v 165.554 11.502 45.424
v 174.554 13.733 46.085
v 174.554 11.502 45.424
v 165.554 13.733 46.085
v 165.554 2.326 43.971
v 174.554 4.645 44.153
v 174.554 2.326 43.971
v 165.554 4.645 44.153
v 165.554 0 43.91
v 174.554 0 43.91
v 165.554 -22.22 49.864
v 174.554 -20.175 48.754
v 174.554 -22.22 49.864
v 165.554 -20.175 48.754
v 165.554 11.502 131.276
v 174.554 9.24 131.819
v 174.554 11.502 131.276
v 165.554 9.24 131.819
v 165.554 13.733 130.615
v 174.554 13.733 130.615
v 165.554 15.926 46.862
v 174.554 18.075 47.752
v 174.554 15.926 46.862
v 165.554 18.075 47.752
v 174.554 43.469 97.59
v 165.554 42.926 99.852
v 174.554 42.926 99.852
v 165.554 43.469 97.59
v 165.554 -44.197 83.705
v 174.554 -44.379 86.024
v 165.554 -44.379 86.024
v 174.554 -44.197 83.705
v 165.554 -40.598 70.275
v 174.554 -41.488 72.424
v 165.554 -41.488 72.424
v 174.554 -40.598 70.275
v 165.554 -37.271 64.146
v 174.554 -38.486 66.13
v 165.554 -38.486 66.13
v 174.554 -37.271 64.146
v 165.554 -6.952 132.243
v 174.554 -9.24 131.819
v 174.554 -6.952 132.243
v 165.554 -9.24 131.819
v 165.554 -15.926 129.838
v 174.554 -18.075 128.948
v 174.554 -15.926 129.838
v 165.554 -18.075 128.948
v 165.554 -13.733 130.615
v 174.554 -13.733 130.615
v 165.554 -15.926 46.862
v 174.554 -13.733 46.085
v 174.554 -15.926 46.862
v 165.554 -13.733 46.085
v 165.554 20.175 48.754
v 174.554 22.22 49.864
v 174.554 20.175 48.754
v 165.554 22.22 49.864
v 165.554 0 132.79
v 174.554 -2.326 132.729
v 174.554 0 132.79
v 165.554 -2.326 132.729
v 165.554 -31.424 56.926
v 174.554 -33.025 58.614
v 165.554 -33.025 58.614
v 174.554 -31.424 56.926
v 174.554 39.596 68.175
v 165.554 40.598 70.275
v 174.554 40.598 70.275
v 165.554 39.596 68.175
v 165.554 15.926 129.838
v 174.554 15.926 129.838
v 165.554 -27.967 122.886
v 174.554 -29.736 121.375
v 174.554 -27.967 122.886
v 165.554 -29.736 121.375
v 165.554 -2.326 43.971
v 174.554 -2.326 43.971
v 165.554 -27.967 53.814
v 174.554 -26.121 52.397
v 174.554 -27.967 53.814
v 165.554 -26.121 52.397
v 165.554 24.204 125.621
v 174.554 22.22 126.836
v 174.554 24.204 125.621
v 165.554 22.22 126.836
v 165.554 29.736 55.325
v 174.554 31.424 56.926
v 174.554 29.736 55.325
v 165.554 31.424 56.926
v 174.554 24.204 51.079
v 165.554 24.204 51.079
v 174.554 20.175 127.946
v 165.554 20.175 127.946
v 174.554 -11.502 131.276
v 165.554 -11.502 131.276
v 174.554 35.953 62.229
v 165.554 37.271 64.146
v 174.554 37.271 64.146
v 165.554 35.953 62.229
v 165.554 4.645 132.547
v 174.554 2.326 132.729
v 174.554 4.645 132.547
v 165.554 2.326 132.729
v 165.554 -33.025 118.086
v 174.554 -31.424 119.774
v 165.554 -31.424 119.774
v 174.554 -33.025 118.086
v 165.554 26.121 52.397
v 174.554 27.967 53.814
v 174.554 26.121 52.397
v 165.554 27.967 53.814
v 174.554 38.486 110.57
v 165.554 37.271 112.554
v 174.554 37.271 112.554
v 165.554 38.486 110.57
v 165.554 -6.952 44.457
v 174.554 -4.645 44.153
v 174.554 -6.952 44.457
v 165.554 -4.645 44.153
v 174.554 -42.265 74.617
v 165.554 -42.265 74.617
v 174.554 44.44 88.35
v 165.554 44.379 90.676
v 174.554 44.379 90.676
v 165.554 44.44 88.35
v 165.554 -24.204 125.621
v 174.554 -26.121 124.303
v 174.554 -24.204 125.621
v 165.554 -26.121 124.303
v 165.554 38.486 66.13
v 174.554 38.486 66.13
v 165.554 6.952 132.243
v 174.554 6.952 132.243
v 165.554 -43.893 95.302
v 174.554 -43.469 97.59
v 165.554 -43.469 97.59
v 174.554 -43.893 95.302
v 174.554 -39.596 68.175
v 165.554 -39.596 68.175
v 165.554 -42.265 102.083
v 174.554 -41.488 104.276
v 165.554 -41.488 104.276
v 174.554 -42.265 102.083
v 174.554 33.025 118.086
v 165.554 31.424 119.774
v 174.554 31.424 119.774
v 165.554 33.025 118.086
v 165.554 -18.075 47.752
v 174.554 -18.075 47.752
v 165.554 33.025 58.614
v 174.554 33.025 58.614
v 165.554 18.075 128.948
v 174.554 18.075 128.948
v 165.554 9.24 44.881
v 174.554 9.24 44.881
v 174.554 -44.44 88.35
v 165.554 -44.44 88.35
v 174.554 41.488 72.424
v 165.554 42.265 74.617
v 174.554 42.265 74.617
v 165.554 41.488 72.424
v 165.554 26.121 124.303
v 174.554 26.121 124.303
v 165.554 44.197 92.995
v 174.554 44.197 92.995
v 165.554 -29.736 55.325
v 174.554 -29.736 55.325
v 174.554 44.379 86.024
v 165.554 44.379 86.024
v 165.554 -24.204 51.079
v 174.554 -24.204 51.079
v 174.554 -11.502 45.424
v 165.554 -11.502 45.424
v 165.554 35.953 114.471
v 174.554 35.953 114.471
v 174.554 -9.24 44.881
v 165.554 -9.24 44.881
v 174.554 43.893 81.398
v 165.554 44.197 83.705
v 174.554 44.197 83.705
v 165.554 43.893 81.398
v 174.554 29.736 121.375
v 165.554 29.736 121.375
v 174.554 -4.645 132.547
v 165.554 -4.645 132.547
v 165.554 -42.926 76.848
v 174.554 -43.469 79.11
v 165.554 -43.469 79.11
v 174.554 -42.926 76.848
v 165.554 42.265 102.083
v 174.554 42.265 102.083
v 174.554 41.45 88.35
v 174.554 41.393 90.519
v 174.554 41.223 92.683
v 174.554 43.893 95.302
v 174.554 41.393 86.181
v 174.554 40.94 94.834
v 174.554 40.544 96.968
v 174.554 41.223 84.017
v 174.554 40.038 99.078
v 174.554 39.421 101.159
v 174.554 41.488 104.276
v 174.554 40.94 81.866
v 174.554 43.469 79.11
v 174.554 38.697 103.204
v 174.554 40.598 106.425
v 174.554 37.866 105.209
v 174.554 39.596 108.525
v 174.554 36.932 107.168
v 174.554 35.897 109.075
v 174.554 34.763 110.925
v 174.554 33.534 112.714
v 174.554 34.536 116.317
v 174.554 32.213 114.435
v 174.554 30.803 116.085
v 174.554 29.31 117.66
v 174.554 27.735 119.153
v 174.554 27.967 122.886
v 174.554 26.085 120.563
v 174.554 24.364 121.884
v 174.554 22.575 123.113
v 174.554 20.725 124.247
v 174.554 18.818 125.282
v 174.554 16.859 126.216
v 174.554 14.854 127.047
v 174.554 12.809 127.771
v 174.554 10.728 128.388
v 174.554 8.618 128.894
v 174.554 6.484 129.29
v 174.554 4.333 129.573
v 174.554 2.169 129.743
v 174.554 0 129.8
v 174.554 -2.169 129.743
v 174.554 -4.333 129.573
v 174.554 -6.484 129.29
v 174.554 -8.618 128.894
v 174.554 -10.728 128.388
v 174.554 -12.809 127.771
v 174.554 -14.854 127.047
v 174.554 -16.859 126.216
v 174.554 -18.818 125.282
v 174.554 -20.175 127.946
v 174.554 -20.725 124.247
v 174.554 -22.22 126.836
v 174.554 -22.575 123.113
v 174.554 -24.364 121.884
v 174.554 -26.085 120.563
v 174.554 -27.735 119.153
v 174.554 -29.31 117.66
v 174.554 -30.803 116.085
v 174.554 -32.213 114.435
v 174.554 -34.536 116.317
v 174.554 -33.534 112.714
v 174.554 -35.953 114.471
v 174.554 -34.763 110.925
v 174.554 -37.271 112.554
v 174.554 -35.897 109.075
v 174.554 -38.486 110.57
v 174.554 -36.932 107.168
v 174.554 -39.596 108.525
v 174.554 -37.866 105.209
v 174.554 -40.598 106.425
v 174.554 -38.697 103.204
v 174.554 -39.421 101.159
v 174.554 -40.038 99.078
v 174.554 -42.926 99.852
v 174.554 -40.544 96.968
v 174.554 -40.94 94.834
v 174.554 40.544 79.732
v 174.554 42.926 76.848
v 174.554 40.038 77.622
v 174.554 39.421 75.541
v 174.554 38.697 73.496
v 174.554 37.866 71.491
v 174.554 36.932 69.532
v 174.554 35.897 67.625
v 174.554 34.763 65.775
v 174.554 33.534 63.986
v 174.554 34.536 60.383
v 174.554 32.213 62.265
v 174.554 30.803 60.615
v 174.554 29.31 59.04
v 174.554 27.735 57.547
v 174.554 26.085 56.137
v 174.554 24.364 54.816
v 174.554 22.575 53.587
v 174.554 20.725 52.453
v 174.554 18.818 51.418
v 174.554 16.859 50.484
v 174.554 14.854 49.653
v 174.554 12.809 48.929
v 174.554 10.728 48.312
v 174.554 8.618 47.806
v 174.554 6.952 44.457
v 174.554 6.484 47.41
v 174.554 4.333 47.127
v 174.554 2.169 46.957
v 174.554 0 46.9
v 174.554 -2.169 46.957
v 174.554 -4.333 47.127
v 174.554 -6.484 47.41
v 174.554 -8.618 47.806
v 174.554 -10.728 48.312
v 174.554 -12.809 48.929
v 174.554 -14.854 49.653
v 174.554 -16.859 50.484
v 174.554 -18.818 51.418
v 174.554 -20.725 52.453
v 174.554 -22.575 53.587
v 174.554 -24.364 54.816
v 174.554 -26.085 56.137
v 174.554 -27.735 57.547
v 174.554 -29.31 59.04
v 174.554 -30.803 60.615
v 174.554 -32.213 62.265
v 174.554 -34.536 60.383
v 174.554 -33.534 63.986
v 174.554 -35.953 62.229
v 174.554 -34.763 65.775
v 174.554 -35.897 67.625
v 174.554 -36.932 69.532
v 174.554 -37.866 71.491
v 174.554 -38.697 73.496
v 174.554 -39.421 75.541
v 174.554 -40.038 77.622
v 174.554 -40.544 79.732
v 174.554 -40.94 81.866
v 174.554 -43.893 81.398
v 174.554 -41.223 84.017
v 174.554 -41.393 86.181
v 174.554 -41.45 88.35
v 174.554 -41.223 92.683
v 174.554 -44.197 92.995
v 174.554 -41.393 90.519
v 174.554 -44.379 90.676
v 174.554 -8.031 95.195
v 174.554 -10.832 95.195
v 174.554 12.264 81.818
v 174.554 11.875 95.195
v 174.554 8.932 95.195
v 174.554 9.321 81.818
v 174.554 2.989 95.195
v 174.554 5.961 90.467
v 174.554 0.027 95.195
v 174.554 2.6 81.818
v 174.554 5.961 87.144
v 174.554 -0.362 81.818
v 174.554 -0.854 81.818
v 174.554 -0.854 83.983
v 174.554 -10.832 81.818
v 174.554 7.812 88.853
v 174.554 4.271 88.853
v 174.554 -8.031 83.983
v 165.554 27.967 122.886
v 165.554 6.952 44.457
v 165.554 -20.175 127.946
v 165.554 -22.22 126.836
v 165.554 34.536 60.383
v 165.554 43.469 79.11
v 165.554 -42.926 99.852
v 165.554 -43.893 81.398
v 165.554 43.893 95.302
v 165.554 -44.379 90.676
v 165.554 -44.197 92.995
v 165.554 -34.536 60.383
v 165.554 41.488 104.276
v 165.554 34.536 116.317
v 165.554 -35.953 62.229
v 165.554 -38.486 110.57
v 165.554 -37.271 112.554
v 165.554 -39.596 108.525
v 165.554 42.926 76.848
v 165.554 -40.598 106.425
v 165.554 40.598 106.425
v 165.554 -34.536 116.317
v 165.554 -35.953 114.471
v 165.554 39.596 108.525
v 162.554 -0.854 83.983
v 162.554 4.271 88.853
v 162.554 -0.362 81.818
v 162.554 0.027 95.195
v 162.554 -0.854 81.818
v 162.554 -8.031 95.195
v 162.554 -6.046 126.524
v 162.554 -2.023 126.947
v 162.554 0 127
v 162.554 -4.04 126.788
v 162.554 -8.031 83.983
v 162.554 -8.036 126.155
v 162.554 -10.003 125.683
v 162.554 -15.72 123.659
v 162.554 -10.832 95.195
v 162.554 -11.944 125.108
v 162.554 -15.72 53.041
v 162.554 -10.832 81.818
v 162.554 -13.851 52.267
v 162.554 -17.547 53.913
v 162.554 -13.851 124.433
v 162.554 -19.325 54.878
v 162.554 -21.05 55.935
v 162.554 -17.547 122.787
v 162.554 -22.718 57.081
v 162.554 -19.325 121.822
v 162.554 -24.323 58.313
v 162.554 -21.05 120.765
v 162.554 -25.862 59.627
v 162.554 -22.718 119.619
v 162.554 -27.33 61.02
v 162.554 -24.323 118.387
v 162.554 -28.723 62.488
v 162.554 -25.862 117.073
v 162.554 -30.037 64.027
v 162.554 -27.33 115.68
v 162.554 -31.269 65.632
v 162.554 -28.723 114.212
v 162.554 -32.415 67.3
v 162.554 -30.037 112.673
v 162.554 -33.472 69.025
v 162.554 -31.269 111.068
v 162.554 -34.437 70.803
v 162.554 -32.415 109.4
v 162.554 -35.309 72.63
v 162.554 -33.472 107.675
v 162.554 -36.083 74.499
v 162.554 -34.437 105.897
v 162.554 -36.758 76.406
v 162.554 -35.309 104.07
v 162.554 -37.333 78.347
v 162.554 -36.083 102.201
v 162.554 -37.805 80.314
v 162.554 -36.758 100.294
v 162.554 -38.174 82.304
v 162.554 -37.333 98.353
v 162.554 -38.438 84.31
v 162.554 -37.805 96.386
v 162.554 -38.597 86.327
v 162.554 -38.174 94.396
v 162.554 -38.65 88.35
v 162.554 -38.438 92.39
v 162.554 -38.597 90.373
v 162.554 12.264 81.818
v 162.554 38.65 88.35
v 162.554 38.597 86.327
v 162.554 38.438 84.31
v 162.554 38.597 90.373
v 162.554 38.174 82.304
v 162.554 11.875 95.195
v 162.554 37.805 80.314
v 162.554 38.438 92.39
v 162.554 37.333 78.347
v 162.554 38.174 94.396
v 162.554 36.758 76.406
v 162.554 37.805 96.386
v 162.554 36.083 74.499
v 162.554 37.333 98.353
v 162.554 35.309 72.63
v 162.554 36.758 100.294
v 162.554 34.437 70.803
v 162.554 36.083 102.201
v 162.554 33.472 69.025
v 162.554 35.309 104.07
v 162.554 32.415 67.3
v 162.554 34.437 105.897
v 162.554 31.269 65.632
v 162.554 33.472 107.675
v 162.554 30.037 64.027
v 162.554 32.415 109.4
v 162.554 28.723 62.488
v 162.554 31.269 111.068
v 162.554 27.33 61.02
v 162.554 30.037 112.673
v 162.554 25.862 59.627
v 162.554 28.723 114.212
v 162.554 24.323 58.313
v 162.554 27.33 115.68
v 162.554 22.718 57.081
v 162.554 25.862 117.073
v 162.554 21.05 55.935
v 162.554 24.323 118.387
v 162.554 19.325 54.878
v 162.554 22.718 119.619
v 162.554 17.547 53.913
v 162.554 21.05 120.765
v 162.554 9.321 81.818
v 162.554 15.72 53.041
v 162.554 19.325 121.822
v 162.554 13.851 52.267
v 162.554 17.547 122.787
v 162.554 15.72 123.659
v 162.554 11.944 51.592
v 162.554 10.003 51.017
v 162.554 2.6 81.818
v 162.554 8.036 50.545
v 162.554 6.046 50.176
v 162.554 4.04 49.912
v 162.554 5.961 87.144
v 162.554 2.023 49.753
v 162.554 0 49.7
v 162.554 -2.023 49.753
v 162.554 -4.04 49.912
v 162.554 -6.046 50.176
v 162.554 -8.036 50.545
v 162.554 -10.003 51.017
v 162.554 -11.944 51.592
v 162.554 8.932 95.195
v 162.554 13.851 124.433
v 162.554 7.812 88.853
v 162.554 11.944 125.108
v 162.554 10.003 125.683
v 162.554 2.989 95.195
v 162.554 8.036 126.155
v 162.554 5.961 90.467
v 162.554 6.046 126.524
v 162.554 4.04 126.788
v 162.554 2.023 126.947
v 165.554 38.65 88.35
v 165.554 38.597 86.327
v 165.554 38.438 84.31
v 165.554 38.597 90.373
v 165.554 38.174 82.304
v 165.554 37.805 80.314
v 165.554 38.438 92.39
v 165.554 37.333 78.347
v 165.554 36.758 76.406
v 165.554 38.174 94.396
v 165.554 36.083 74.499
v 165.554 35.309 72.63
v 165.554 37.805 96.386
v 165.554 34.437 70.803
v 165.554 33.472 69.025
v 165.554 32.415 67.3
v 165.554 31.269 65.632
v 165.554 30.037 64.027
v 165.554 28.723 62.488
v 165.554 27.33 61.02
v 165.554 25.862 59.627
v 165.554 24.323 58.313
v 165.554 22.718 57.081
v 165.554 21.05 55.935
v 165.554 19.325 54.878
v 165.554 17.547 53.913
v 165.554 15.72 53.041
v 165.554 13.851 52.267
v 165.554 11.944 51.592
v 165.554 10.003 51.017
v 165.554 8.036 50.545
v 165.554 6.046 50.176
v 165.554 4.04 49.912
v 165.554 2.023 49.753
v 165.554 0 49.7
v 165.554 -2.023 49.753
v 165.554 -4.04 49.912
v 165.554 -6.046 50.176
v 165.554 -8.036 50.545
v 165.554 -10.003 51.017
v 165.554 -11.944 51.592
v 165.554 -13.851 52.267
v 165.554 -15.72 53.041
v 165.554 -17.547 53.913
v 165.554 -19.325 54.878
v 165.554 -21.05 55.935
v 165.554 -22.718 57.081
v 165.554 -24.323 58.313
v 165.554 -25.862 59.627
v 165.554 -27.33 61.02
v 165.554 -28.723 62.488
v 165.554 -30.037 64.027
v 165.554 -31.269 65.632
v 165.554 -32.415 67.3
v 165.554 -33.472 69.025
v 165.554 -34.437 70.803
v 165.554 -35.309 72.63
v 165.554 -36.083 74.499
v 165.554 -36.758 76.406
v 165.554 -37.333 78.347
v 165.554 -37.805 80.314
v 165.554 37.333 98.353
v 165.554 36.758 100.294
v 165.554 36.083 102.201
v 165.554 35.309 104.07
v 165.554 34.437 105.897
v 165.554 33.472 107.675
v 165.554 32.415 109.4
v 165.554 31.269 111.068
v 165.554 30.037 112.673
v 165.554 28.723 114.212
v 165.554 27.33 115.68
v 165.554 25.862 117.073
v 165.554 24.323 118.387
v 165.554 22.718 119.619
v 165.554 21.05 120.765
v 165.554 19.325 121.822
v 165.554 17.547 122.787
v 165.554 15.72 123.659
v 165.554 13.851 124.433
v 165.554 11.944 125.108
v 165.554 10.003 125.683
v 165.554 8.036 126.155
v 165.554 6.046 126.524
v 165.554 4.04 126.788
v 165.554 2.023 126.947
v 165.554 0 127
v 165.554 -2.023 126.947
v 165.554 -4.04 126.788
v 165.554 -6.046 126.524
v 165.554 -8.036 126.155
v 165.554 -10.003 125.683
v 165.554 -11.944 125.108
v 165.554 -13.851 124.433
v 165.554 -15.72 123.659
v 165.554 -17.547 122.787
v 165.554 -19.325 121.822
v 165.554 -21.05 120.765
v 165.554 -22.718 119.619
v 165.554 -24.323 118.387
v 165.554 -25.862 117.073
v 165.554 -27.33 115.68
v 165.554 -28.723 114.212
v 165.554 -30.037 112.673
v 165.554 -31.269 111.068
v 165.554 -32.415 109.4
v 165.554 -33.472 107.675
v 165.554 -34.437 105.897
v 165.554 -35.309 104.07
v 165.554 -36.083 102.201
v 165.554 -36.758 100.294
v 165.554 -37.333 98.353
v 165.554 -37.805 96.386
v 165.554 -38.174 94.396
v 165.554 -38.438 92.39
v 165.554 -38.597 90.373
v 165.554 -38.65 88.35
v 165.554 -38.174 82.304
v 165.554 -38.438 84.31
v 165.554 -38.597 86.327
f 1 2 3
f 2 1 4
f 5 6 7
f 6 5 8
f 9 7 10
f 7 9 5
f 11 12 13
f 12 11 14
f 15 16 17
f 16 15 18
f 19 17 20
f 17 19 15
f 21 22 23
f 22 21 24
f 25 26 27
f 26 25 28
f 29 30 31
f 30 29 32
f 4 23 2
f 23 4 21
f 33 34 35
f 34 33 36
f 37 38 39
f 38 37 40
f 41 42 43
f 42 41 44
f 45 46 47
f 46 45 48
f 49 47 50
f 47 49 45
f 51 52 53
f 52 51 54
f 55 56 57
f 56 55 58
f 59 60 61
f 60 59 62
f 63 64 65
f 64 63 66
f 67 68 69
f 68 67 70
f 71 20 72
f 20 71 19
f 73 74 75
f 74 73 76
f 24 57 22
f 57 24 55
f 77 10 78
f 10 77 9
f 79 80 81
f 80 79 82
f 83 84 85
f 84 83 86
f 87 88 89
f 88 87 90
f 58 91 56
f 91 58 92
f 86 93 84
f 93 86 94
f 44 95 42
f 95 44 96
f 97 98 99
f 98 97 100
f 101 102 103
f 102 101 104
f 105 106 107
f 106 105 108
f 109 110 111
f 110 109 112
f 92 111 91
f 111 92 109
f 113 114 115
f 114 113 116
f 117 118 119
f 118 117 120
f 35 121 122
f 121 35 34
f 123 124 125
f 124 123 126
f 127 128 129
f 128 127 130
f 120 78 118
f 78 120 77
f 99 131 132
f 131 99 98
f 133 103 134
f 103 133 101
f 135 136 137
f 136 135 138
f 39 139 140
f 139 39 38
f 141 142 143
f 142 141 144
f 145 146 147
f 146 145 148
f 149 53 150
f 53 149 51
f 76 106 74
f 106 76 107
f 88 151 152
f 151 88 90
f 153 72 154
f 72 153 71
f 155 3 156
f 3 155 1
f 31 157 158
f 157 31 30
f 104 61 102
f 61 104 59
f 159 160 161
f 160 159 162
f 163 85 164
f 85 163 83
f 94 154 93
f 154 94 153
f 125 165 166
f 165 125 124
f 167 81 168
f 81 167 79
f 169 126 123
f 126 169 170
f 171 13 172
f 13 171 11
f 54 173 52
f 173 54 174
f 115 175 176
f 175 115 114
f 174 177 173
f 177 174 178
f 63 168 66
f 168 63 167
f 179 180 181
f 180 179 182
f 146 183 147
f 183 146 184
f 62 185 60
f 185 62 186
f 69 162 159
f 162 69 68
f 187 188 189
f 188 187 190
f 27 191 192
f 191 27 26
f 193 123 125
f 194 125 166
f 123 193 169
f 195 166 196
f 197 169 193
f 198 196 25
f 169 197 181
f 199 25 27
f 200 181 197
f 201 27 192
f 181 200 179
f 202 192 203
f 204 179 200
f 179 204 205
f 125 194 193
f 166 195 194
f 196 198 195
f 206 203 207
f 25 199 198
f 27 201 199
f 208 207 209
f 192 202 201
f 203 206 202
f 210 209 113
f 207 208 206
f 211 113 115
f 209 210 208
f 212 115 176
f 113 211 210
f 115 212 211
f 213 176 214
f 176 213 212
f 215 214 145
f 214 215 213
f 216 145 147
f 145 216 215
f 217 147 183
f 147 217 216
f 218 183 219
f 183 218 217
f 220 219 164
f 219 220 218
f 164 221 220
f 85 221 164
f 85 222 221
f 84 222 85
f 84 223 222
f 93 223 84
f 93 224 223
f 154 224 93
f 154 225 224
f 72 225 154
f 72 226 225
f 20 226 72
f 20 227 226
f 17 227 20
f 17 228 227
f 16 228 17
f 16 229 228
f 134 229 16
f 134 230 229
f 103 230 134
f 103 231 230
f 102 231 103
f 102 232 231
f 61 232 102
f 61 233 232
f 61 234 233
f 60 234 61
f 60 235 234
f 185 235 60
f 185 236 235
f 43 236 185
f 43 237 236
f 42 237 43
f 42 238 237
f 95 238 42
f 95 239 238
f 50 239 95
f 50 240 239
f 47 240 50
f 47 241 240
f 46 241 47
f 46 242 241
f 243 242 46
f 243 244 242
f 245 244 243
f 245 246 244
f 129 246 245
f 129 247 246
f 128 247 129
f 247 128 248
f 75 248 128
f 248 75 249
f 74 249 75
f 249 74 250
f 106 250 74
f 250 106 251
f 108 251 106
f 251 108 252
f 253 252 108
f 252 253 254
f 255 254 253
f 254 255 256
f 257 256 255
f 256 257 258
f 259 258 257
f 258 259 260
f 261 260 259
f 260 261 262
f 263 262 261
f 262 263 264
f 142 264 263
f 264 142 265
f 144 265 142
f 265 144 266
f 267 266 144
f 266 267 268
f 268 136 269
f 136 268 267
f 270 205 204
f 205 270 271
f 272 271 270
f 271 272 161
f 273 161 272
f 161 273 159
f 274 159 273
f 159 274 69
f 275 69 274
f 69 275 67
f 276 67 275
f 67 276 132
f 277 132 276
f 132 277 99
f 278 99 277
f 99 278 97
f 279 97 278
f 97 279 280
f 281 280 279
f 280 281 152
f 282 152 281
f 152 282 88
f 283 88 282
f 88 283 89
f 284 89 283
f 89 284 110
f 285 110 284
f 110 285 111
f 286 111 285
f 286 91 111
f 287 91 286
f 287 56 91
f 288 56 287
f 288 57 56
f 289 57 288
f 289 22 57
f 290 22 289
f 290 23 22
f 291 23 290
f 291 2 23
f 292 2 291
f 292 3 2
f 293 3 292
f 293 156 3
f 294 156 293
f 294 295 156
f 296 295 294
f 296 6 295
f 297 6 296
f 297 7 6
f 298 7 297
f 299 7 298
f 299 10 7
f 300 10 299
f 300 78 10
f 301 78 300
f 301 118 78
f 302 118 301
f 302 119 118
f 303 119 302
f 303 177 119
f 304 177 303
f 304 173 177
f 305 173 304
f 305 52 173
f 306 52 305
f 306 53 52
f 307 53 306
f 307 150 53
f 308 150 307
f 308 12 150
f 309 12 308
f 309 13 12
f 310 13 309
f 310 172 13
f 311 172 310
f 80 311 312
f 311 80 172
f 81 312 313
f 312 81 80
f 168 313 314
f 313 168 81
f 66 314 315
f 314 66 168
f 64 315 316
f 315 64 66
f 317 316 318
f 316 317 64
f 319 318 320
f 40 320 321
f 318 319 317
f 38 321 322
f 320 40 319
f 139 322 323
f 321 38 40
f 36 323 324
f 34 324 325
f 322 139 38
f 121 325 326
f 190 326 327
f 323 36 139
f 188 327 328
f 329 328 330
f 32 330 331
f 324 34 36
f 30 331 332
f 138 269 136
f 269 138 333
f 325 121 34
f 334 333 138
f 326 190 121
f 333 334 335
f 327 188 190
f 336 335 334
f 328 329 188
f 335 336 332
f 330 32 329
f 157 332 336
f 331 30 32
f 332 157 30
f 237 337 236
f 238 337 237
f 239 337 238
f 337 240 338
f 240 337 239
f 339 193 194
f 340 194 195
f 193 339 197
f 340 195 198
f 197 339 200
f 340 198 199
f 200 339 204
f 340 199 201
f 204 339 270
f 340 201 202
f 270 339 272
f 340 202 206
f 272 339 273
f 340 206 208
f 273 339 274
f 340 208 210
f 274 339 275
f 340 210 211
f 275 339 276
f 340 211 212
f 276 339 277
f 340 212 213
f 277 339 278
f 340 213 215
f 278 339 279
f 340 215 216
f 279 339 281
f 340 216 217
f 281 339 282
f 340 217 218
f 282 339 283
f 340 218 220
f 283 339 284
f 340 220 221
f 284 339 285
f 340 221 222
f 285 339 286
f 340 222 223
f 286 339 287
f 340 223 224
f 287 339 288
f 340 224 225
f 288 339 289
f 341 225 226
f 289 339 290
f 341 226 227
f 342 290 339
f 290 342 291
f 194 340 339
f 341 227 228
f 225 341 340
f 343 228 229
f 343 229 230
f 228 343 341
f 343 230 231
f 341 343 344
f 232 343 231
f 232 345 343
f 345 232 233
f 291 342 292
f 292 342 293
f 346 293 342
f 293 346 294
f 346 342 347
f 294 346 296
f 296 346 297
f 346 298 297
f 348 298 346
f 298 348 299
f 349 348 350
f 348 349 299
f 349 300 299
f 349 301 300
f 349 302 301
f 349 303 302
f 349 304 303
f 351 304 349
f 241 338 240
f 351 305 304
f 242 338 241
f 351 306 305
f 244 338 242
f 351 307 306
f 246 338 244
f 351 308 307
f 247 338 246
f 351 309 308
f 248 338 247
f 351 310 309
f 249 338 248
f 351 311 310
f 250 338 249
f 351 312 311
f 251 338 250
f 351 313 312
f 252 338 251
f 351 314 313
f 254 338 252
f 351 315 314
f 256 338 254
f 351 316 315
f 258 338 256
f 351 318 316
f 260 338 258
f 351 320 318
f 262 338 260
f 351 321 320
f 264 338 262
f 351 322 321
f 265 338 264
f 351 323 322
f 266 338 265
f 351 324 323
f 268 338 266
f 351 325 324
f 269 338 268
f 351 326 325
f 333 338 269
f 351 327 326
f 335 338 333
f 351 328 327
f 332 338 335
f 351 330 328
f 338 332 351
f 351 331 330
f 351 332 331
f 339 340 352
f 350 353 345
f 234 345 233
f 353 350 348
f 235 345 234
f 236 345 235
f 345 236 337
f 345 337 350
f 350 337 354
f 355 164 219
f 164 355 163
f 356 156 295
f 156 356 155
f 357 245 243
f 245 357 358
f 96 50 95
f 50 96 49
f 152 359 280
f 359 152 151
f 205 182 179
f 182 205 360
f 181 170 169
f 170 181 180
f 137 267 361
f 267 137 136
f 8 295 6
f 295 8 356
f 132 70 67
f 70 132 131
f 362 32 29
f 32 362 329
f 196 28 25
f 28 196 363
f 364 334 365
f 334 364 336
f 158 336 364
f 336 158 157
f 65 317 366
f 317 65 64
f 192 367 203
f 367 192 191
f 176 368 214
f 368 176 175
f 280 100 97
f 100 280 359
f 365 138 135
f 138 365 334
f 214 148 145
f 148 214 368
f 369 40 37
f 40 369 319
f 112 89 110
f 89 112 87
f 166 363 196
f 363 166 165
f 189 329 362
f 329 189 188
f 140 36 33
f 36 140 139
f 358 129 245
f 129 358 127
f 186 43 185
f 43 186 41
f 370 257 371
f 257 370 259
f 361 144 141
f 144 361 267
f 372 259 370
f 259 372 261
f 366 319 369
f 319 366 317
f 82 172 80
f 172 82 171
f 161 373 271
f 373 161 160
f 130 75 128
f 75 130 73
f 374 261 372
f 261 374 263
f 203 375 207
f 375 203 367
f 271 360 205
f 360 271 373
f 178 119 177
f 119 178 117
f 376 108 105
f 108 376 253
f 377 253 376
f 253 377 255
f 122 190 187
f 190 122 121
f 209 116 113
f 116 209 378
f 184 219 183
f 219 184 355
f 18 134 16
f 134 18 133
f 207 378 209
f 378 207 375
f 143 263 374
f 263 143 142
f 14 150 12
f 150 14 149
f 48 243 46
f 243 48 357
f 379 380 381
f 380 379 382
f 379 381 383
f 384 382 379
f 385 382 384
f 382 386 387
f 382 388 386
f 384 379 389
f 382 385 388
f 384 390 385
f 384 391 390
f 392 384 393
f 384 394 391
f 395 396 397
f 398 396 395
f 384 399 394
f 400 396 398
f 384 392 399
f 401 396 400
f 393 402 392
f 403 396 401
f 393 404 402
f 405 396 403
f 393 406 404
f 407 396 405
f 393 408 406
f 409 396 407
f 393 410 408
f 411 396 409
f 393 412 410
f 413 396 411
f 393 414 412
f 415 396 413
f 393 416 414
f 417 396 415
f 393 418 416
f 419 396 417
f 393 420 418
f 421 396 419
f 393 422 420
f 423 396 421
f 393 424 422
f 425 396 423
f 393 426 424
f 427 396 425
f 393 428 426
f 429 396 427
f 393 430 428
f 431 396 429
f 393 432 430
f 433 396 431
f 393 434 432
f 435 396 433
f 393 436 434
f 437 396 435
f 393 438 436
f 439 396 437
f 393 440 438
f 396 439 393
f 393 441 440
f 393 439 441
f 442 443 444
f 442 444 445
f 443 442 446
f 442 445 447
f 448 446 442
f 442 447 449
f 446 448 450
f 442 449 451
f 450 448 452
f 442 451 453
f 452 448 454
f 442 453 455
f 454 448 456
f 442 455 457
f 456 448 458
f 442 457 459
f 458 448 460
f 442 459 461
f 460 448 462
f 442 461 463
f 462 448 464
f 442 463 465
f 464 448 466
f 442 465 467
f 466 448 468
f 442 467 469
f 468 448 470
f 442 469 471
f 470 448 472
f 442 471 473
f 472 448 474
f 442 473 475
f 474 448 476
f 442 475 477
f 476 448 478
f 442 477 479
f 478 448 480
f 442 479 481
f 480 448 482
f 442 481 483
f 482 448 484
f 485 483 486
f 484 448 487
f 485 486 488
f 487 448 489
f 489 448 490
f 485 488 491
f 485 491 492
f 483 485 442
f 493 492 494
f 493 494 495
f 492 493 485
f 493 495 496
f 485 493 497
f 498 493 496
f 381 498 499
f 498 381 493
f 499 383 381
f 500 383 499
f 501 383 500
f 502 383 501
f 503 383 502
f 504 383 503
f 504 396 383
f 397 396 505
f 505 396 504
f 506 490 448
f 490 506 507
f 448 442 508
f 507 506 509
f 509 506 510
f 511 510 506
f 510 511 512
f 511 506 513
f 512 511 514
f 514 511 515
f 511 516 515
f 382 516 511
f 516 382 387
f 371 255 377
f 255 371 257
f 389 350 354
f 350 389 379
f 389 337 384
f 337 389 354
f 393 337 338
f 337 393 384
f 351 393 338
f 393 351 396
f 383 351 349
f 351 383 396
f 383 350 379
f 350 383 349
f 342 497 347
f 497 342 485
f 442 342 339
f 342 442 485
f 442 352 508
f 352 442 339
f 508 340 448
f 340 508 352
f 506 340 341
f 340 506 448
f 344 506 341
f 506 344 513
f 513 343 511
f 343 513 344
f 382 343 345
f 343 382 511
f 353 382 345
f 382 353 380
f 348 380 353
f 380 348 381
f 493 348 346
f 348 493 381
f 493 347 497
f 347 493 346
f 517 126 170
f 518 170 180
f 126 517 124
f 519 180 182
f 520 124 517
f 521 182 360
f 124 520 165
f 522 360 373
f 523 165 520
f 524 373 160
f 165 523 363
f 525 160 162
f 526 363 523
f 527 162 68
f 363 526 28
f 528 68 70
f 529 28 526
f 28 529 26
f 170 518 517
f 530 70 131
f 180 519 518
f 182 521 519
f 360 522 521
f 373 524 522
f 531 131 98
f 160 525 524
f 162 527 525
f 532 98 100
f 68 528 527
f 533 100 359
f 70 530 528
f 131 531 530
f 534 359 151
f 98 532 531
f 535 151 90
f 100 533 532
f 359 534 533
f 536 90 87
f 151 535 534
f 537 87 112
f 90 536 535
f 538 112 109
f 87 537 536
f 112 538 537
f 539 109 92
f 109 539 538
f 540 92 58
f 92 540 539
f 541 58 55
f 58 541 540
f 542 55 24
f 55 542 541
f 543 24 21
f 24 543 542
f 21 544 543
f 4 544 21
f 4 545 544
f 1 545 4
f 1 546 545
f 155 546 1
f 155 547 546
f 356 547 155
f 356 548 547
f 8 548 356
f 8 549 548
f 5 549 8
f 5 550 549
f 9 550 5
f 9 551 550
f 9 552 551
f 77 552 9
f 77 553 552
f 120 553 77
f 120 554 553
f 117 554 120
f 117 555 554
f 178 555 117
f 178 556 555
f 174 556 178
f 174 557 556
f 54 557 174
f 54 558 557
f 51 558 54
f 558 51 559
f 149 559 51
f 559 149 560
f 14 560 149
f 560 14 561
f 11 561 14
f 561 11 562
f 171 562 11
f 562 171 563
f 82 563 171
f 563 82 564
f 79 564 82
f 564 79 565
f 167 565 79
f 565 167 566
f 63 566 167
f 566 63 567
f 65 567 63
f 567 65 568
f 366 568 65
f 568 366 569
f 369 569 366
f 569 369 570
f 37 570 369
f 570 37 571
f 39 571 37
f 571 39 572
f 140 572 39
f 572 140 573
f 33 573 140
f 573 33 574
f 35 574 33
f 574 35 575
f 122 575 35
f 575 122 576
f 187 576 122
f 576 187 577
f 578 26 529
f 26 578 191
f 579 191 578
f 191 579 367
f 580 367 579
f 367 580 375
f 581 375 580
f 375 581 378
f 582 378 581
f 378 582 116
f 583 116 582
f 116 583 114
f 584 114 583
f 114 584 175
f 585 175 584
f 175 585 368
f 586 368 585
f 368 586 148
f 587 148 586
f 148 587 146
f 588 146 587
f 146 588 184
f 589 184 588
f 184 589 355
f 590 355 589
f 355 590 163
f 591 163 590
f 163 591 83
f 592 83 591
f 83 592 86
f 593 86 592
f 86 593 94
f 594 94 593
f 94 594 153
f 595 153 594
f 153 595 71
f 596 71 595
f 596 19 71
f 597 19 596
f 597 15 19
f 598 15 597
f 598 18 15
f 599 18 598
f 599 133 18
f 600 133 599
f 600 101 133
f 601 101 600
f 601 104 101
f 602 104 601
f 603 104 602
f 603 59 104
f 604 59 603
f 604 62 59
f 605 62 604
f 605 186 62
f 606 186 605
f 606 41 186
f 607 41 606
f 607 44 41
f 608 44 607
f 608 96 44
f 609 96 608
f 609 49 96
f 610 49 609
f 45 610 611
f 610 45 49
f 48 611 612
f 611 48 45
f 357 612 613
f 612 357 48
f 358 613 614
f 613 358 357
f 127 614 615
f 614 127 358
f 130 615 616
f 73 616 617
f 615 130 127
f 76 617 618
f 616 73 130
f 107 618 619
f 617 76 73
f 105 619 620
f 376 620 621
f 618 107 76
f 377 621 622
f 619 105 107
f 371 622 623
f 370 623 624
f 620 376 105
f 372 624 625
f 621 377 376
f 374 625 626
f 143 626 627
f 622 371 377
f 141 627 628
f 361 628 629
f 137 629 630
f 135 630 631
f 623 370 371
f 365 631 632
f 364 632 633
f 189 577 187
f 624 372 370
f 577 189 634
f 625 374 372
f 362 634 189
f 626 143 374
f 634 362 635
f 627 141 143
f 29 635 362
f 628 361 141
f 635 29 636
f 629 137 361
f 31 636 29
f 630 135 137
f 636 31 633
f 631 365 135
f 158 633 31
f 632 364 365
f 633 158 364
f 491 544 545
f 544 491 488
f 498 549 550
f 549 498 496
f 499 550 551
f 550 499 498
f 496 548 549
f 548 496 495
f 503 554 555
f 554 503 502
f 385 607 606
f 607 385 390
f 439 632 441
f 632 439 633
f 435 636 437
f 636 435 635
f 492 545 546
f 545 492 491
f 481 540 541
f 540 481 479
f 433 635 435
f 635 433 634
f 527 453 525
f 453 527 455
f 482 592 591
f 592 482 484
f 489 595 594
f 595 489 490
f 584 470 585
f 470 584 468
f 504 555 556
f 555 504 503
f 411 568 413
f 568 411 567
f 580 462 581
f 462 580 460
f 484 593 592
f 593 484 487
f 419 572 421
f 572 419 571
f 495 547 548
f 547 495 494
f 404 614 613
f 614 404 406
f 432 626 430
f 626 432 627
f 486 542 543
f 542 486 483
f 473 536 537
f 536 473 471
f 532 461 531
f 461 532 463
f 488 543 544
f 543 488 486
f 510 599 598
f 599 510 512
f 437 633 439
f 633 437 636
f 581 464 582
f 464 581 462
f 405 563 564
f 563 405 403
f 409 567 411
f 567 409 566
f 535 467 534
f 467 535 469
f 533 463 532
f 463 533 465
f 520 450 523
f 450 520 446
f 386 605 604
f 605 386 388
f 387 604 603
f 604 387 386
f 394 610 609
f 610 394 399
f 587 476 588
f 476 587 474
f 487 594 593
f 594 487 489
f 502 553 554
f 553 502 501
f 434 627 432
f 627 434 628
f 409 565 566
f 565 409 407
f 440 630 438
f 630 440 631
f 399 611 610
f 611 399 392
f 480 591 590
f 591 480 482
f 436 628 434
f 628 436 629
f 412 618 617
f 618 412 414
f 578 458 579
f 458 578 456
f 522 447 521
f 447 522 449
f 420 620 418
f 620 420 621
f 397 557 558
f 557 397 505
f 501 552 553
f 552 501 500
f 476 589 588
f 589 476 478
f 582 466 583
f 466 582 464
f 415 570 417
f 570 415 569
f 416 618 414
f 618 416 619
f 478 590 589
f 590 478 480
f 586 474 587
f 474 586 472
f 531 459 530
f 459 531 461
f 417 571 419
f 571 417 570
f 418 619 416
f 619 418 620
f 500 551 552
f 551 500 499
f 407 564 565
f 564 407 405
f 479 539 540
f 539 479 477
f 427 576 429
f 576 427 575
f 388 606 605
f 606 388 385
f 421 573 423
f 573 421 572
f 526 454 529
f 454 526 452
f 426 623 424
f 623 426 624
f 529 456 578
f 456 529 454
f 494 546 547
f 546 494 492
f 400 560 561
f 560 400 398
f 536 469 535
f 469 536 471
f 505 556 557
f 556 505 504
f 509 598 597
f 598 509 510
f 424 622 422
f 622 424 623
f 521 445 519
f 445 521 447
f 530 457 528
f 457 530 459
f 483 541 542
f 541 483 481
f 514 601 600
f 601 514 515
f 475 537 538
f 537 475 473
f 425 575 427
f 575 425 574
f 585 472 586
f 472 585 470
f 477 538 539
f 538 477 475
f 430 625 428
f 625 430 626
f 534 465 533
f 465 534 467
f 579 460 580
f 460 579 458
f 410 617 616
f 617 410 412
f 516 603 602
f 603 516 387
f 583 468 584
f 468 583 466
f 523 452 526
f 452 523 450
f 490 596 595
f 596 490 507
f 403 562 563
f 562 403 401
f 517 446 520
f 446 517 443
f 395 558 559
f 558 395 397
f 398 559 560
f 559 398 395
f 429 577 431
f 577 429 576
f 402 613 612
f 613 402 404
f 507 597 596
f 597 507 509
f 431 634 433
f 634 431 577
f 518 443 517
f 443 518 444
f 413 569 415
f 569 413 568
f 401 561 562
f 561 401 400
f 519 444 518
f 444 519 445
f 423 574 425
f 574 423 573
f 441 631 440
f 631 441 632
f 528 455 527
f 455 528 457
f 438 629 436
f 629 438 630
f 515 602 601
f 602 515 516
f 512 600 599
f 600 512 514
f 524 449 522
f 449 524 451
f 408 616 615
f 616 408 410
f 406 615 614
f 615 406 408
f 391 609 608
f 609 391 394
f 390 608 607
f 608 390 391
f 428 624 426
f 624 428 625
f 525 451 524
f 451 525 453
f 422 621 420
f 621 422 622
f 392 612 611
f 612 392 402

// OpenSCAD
// file: util.scad
// Used by top ring to build its three solids

//chanfered_ring();
//chanfered_box();
//pipe(ir1=100, ir2=90, t=10, h=30, $fn=120);
//pipe(ir=100, t=10, h=30, $fn=120);
//chanfered_profile(c4=[2,3]);
//chanfered_cylinder(ir=40, h=40, taper_bottom=-5, c4=[2,2], $fn=120);
//cylinder(r=10,h=40);
//chanfered_cylinder(h=40, t=20, c3=[2,2], center=false, $fn=120);
//beveled_cube(size=[30,30,5], radius=5, chanfer=[1,1], $fn=120);

chanfer=1;
chanfer_angle=4;
bottom_chanfer_scale=4;
m=25.4;

//Used by chanfered_cylinder
module chanfered_profile(x=10, dx_top=0, dx_bottom=0, y=20, c1=[0,0], c2=[0,0], c3=[0,0], c4=[0,0]) {
  polygon(points=[
    [dx_bottom+0+c1[0],0],
    [dx_bottom+x-c2[0],0],
    [dx_bottom+x,c2[1]],
    [dx_top+x,y-c3[1]],
    [dx_top+x-c3[0],y],
    [dx_top+0+c4[0],y],
    [dx_top+0,y-c4[1]],
    [dx_bottom+0,c1[1]],
  ]);
}

module chanfered_cylinder(ir=0, taper_top=0, taper_bottom=0, t=10, h=20, c1=[0,0], c2=[0,0], c3=[0,0], c4=[0,0], center=false) {
  translate([0,0,center ? -h/2 : 0])
    rotate_extrude()
      translate([ir,0,0])
        chanfered_profile(x=t, dx_top=taper_top, dx_bottom=taper_bottom, y=h, c1=c1, c2=c2, c3=c3, c4=c4);
}

module profile(w, h, c=chanfer, a=chanfer_angle) {
  polygon(points=[
    [0,0],
    [w-bottom_chanfer_scale*c,0],
    [w,bottom_chanfer_scale*(c+a)],
    [w,h-c],
    [w-c,h],
    [0,h],
  ]);
}

module chanfered_ring(ir=0, w=10, h=20, c=chanfer) {
  rotate_extrude()
    translate([ir,0,0])
      profile(w=w, h=h, c=c);
}

module chanfered_box(l=30, w=10, h=20, c=chanfer) {
  linear_extrude(height=l) {
    profile(w=w/2, h=h, c=c);
    mirror([1,0,0])
    profile(w=w/2, h=h, c=c);
  }
}

//For now centered
//Duplicates hollow_cylinder
module pipe(ir, ir1, ir2, t, h) {
  difference() {
    cylinder(r=ir+t, r1=ir1+t, r2=ir2+t, h=h, center=true);
    cylinder(r=ir, r1=ir1, r2=ir2, h=h+.01, center=true);
  }
}


// Defaults to 6-32 1/2 inch
//First print of terminal cup: module screw_hole(r_shaft=1.8, l_shaft=.5*m, r_head=3.4, l_head=10) {
//TODO shaft radius wants to be small for diffencing holes in other part yet large for this part.
module screw_hole(r_shaft=1.8, l_shaft=.5*m, r_head=3.8, l_head=10) {
  cylinder(r=r_head, l_head);
  translate([0,0,-l_shaft])
    cylinder(r=r_shaft, l_shaft+.01);
}

// Move to basic geometry library
// Duplicates code in plumbing library
module hollow_cylinder(ir, t, h) {
  difference() {
    cylinder(r=ir+t, h=h, center=true);
    cylinder(r=ir, h=h+2, center=true);
  }
}

// Move to util library
module radial_section_of(d=1000, angle=90) {
  difference() {
    children(0);
    union() {
      rotate([0,0,90-angle/2]) translate([-d/2,0,0]) cube(size=[d,d,d], center=true);
      rotate([0,0,-90+angle/2]) translate([-d/2,0,0]) cube(size=[d,d,d], center=true);
    }
  }
}

module radial_array(n=4, r=0) {
  for(rz=[0:360/n:359]) {
    rotate([0,0,rz])
        translate([r,0,0])
            children(0);
  }
}

module prism(sides=4, height=10, r=20, corner_radius=5, c2=[0,0], c3=[0,0]) {
  translate([0,0,height/2])
    minkowski() {
      cylinder(
        r=r,
        h=.0001,
        center=true,
        $fn=sides
      );
     chanfered_cylinder(t=corner_radius, h=height, c2=c2, c3=c3, center=true); 
    }
}
// file: plumbing.scad
//coupler();

m=25.4;

id_large=122;
id_small=111;
thickness=8.3;

center_profile_height=20;
outer_profile_height=42;
//Makes the top lip a little wider and deeper so that its
//groove in the top ring is deep enough after cleaning support material
tol=1;

module coupler_outer_profile(t=thickness, d=5+tol, w=16, o=1.8, h=outer_profile_height) {
  polygon(points=[
    [0,0],
    [t,0],
    [t,h-d-w],
    [t-o,h-d-w],
    [t-o,h-d],
    [t+tol,h-d],
    [t+tol,h],
    [0,h],
  ]);
}

module coupler_center_profile(t=thickness, h=center_profile_height, d=(id_large-id_small)/2) {
  polygon(points=[
    [0,0],
    [t,0],
    [d+t,h],
    [d,h],
  ]);
}

module coupler(r1=id_small/2, r2=id_large/2) {
  translate([0,0,-(2*outer_profile_height+center_profile_height)])
  rotate_extrude()
  translate([r1, outer_profile_height, 0]) {
    translate([r2-r1,center_profile_height,0]) coupler_outer_profile();
    coupler_center_profile();
    mirror([1,0,0]) rotate([0,0,180]) coupler_outer_profile();
  }
}

module abs_pipe(r, t, h) {
  difference() {
    cylinder(r=r+t, h=h);
    translate([0,0,-1]) cylinder(r=r, h=h+2);
  }
}
// file: lx.scad
include <plumbing.scad>;
include <util.scad>;

//lx($fn=200);
//fullrange($fn=200);
//fullrange_pipe($fn=200);
//woofer($fn=200);
//woofer_pipe($fn=200);
//logo(font="Liberation Sans:style=Bold");

// Imperial to metric conversion factor
m=25.4;

// The frame will be differenced with the woofer and fullrange rings
// Tried at 2 for second prototype
frame_diameter_tolerance=1.4;
// Pipes are differenced with rings mounted on exterior on one end, and diffuser or stand mounted on interior on other
pipe_tolerance=0;
// The frame of the woofer is tapered. This has to be big enough so that the frame fits into coupler
gap_woofer_frame_pipe_top=17;

fullrange_pipe_interior_radius=77.3/2-pipe_tolerance;
fullrange_pipe_thickness=5.8+2*pipe_tolerance;
fullrange_pipe_outer_radius=fullrange_pipe_interior_radius+fullrange_pipe_thickness;
fullrange_pipe_length=5*m;

fullrange_frame_diameter=97.7+frame_diameter_tolerance;
fullrange_frame_radius=fullrange_frame_diameter/2;
fullrange_frame_thickness=5.4;
fullrange_frame_width_at_mounting_holes=8.5;
//Two blocks 3.4 inch mdf + inner pipe radius + space for screws
fullrange_above_woofer=(2*.75 + 3/2 +.25)*m + fullrange_pipe_thickness;
//fullrange_above_woofer=3.25*m;
fullrange_back_from_center=3/8*m;
fullrange_frame_to_pipe=8/7*m;

woofer_frame_diameter=146+frame_diameter_tolerance;
woofer_frame_radius=woofer_frame_diameter/2;
woofer_frame_thickness=7.15;
woofer_frame_width_at_mounting_holes=10;
woofer_frame_to_pipe=3.25*m;

woofer_pipe_inner_radius=100.3/2;
woofer_pipe_thickness=6.9;
woofer_pipe_outer_radius=woofer_pipe_inner_radius+woofer_pipe_thickness;
woofer_pipe_length=31*m;

logo_text="LX";

module lx() {
  fullrange();
  woofer();
}

module fullrange() {
  translate([fullrange_back_from_center,0,fullrange_above_woofer])
  rotate([0,90,0]) {
    translate([0,0,-fullrange_frame_thickness])
      driver(
        frame_outer_radius=fullrange_frame_radius,
        frame_height=fullrange_frame_thickness,
        hole_center_from_outer_edge_frame=4.8,
        num_holes=4
      );
    translate([0,0,fullrange_frame_to_pipe])
      fullrange_pipe();
   }
}


module woofer() {
  rotate([0,180,0]) {
    translate([0,0,-woofer_frame_thickness])
    rotate([0,0,30])
      driver(
        frame_outer_radius=woofer_frame_diameter/2,
        frame_height=woofer_frame_thickness
      );
    translate([0,0,woofer_frame_to_pipe])
    woofer_pipe();
  }
  translate([0,0,-gap_woofer_frame_pipe_top])
    coupler();
}

module fullrange_pipe() {
  abs_pipe(
    r=fullrange_pipe_interior_radius,
    t=fullrange_pipe_thickness,
    h=fullrange_pipe_length
  );
}

module woofer_pipe() {
  abs_pipe(
    r=woofer_pipe_inner_radius,
    t=woofer_pipe_thickness,
    h=woofer_pipe_length
  );  
}

module driver(
  frame_outer_radius,
  frame_height,
  hole_width=1.9,
  hole_depth=15,
  hole_center_from_outer_edge_frame=4,
  num_holes=6)
{  
  union() {
    cylinder(r=frame_outer_radius, h=frame_height);
    radial_array(n=num_holes, r=frame_outer_radius-frame_diameter_tolerance/2-hole_center_from_outer_edge_frame)
      cylinder(r=hole_width, h=frame_height+hole_depth, $fn=16);
  }
}

module logo(text=logo_text, size=1, height=1, font, spacing) {
  linear_extrude(height=height, center=false)
    text(text=logo_text, halign="center", valign="center", size=size, font=font, spacing=spacing);
}
// main file
include <lx.scad>;

cap_height=12;
cap_rim_thickness=3;
cap_rim_height=0;
cap_inset=3;
cap_logo_size=14;

fullrange_cap($fn=120);
//cap_less_logo($fn=120);

module fullrange_cap() {
  difference() {
    cap_positioned();
    #fullrange();
  }
}

module cap_positioned() {
  translate([
    fullrange_back_from_center
    +fullrange_frame_to_pipe
    +fullrange_pipe_length
    -cap_inset,
    0,
    fullrange_above_woofer
  ])
    rotate([0,90,0])
      cap_rimmed();
}

module cap_rimmed() {
  difference() {
    cap_less_logo();
    translate([0,0,cap_height-cap_rim_height])
      cylinder(r=fullrange_pipe_outer_radius-cap_rim_thickness, h=cap_rim_height+1);
  }
}

module cap_less_logo() {
  difference() {
    cap();
    rotate([0,0,90])
      logo(size=cap_logo_size, height=100, font="Liberation Sans:style=Bold", spacing=1);
  }
}

module cap() {
  cylinder(r=fullrange_pipe_outer_radius-.01, h=cap_height);
}
